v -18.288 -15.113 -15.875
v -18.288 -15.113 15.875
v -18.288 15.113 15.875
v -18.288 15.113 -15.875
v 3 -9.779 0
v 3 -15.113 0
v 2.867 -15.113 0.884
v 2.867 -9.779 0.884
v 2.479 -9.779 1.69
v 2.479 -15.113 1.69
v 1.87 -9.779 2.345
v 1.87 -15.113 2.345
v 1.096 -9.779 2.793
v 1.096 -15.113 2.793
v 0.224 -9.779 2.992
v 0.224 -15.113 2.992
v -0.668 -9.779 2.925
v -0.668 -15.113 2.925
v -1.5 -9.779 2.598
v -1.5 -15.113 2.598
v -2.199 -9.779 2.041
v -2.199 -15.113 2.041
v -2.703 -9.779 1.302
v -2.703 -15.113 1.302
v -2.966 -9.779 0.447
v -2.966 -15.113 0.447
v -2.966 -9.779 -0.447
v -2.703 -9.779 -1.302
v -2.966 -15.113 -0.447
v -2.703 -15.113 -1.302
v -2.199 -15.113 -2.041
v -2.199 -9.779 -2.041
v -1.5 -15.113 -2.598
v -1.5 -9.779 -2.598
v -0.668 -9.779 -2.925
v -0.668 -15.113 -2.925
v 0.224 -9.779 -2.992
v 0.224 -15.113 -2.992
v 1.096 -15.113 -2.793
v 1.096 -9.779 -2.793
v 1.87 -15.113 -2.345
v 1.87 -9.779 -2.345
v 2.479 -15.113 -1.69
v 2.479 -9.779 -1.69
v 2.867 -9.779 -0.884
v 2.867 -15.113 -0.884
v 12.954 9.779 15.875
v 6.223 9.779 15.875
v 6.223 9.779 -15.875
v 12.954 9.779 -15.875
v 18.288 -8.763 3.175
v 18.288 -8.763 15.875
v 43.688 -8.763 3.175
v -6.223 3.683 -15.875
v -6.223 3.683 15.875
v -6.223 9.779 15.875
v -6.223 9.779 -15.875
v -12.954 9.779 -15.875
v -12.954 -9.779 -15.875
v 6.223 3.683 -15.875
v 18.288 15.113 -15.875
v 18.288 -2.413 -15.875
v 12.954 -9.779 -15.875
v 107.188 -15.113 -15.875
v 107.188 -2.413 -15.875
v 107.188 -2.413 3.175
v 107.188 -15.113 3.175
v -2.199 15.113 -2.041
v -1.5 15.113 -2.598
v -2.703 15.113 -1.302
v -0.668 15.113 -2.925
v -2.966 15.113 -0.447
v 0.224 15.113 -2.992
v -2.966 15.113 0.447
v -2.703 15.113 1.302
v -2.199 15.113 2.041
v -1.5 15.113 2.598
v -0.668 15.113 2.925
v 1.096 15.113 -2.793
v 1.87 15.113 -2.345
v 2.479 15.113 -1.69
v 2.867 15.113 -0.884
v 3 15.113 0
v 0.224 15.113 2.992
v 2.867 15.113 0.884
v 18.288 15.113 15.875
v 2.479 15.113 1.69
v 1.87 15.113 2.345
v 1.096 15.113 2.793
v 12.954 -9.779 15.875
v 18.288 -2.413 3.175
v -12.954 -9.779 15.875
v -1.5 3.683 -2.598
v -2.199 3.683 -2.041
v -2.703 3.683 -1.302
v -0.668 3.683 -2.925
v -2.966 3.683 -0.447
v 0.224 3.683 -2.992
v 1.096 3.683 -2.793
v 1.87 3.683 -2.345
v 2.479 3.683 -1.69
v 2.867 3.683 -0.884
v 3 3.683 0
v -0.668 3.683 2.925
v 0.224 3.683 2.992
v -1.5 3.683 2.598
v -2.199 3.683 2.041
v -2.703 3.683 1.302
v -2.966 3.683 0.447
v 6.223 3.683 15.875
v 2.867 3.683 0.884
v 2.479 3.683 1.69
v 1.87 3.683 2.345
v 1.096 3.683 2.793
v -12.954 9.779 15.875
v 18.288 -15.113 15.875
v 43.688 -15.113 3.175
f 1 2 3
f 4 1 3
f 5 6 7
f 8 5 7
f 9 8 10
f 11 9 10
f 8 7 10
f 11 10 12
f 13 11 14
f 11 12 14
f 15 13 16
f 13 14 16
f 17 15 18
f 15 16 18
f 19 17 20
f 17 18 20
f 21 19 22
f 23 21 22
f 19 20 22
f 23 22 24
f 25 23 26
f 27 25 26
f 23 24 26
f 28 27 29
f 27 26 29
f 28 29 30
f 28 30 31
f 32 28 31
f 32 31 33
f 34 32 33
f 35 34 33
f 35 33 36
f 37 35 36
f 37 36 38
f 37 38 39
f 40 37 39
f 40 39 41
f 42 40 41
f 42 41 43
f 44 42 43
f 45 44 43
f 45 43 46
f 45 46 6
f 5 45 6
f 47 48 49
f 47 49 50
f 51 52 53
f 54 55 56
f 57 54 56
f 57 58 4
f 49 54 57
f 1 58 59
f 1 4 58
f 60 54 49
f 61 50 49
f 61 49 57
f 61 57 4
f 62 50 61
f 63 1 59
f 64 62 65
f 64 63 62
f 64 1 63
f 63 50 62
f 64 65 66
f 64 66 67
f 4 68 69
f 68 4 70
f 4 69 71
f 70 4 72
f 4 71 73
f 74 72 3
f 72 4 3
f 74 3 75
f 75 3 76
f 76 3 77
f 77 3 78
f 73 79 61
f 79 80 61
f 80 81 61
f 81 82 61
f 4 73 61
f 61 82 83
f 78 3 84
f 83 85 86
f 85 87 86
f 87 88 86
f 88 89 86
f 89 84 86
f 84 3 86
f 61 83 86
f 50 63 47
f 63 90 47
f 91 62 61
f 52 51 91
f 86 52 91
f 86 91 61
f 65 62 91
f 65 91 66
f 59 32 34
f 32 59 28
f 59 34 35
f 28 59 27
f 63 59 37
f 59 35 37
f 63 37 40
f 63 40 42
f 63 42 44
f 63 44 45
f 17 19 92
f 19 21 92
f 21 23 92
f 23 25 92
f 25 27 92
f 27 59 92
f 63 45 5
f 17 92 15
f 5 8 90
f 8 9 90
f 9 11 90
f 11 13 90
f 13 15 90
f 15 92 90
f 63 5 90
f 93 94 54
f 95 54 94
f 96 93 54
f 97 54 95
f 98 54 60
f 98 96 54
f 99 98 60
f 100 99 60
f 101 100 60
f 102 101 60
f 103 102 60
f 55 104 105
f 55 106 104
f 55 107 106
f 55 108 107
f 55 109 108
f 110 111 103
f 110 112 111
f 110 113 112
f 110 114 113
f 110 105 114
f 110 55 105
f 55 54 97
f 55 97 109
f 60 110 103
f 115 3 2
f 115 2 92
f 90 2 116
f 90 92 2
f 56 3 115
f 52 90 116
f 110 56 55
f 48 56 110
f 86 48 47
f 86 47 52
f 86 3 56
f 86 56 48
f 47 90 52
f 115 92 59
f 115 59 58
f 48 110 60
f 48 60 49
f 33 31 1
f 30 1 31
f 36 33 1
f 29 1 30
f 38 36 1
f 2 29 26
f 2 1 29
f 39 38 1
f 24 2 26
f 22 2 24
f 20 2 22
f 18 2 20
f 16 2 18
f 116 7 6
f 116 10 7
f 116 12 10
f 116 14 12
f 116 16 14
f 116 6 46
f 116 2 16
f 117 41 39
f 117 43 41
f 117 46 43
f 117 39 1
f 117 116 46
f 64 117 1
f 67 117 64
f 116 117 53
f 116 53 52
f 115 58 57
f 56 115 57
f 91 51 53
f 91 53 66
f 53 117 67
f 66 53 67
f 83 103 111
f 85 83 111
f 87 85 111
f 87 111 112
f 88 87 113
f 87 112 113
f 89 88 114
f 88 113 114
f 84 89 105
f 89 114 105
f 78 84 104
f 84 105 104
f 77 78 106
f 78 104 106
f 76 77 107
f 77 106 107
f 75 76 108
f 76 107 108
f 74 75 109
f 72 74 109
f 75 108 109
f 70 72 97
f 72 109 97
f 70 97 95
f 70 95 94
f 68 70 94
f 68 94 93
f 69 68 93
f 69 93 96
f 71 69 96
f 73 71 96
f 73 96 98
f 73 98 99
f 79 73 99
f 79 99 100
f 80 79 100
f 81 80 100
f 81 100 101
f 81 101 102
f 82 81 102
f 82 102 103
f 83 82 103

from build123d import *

# Parameters (mm, degrees)
F0_W      = 36.576
F0_H      = 30.226
F0_W_2    = 25.908
F0_H_2    = 19.558
F1_DEPTH  = 15.875
F2_W      = 12.446
F2_H      = 6.096
F3_DEPTH  = 31.75
F4_W      = 88.9
F4_H      = 12.7
F5_DEPTH  = 19.05
F7_DEPTH  = 6.35
F9_R      = 3
F10_DEPTH = 30.227


with BuildPart() as f1:
    # F0 (on Top) → F1 (new body, symmetric)
    with BuildSketch(Plane.XY):
        Rectangle(F0_W, F0_H)
        Rectangle(F0_W_2, F0_H_2, mode=Mode.SUBTRACT)
    extrude(amount=F1_DEPTH, both=True)

    # F2 (on face) → F3 (join)
    with BuildSketch(Plane.XY.offset(15.875)):
        with Locations((0, 6.731)):
            Rectangle(F2_W, F2_H)
    extrude(amount=-F3_DEPTH)

    # F4 (on face) → F5 (join)
    with BuildSketch(Plane(origin=(0, 0, -15.875), x_dir=(1, 0, 0), z_dir=(0, 0, -1))):
        with Locations((62.738, 8.763)):
            Rectangle(F4_W, F4_H)
    extrude(amount=-F5_DEPTH)

    # F6 (on face) → F7 (join)
    with BuildSketch(Plane.XZ.offset(15.113)):
        Polygon((43.688, 3.175), (18.288, 15.875), (18.288, 3.175), align=None)
    extrude(amount=-F7_DEPTH)

    # F9 (on face) → F10 (cut, through all)
    with BuildSketch(Plane.XZ.offset(15.113)):
        Circle(F9_R)
    extrude(amount=-F10_DEPTH, mode=Mode.SUBTRACT)


solid = f1.part
